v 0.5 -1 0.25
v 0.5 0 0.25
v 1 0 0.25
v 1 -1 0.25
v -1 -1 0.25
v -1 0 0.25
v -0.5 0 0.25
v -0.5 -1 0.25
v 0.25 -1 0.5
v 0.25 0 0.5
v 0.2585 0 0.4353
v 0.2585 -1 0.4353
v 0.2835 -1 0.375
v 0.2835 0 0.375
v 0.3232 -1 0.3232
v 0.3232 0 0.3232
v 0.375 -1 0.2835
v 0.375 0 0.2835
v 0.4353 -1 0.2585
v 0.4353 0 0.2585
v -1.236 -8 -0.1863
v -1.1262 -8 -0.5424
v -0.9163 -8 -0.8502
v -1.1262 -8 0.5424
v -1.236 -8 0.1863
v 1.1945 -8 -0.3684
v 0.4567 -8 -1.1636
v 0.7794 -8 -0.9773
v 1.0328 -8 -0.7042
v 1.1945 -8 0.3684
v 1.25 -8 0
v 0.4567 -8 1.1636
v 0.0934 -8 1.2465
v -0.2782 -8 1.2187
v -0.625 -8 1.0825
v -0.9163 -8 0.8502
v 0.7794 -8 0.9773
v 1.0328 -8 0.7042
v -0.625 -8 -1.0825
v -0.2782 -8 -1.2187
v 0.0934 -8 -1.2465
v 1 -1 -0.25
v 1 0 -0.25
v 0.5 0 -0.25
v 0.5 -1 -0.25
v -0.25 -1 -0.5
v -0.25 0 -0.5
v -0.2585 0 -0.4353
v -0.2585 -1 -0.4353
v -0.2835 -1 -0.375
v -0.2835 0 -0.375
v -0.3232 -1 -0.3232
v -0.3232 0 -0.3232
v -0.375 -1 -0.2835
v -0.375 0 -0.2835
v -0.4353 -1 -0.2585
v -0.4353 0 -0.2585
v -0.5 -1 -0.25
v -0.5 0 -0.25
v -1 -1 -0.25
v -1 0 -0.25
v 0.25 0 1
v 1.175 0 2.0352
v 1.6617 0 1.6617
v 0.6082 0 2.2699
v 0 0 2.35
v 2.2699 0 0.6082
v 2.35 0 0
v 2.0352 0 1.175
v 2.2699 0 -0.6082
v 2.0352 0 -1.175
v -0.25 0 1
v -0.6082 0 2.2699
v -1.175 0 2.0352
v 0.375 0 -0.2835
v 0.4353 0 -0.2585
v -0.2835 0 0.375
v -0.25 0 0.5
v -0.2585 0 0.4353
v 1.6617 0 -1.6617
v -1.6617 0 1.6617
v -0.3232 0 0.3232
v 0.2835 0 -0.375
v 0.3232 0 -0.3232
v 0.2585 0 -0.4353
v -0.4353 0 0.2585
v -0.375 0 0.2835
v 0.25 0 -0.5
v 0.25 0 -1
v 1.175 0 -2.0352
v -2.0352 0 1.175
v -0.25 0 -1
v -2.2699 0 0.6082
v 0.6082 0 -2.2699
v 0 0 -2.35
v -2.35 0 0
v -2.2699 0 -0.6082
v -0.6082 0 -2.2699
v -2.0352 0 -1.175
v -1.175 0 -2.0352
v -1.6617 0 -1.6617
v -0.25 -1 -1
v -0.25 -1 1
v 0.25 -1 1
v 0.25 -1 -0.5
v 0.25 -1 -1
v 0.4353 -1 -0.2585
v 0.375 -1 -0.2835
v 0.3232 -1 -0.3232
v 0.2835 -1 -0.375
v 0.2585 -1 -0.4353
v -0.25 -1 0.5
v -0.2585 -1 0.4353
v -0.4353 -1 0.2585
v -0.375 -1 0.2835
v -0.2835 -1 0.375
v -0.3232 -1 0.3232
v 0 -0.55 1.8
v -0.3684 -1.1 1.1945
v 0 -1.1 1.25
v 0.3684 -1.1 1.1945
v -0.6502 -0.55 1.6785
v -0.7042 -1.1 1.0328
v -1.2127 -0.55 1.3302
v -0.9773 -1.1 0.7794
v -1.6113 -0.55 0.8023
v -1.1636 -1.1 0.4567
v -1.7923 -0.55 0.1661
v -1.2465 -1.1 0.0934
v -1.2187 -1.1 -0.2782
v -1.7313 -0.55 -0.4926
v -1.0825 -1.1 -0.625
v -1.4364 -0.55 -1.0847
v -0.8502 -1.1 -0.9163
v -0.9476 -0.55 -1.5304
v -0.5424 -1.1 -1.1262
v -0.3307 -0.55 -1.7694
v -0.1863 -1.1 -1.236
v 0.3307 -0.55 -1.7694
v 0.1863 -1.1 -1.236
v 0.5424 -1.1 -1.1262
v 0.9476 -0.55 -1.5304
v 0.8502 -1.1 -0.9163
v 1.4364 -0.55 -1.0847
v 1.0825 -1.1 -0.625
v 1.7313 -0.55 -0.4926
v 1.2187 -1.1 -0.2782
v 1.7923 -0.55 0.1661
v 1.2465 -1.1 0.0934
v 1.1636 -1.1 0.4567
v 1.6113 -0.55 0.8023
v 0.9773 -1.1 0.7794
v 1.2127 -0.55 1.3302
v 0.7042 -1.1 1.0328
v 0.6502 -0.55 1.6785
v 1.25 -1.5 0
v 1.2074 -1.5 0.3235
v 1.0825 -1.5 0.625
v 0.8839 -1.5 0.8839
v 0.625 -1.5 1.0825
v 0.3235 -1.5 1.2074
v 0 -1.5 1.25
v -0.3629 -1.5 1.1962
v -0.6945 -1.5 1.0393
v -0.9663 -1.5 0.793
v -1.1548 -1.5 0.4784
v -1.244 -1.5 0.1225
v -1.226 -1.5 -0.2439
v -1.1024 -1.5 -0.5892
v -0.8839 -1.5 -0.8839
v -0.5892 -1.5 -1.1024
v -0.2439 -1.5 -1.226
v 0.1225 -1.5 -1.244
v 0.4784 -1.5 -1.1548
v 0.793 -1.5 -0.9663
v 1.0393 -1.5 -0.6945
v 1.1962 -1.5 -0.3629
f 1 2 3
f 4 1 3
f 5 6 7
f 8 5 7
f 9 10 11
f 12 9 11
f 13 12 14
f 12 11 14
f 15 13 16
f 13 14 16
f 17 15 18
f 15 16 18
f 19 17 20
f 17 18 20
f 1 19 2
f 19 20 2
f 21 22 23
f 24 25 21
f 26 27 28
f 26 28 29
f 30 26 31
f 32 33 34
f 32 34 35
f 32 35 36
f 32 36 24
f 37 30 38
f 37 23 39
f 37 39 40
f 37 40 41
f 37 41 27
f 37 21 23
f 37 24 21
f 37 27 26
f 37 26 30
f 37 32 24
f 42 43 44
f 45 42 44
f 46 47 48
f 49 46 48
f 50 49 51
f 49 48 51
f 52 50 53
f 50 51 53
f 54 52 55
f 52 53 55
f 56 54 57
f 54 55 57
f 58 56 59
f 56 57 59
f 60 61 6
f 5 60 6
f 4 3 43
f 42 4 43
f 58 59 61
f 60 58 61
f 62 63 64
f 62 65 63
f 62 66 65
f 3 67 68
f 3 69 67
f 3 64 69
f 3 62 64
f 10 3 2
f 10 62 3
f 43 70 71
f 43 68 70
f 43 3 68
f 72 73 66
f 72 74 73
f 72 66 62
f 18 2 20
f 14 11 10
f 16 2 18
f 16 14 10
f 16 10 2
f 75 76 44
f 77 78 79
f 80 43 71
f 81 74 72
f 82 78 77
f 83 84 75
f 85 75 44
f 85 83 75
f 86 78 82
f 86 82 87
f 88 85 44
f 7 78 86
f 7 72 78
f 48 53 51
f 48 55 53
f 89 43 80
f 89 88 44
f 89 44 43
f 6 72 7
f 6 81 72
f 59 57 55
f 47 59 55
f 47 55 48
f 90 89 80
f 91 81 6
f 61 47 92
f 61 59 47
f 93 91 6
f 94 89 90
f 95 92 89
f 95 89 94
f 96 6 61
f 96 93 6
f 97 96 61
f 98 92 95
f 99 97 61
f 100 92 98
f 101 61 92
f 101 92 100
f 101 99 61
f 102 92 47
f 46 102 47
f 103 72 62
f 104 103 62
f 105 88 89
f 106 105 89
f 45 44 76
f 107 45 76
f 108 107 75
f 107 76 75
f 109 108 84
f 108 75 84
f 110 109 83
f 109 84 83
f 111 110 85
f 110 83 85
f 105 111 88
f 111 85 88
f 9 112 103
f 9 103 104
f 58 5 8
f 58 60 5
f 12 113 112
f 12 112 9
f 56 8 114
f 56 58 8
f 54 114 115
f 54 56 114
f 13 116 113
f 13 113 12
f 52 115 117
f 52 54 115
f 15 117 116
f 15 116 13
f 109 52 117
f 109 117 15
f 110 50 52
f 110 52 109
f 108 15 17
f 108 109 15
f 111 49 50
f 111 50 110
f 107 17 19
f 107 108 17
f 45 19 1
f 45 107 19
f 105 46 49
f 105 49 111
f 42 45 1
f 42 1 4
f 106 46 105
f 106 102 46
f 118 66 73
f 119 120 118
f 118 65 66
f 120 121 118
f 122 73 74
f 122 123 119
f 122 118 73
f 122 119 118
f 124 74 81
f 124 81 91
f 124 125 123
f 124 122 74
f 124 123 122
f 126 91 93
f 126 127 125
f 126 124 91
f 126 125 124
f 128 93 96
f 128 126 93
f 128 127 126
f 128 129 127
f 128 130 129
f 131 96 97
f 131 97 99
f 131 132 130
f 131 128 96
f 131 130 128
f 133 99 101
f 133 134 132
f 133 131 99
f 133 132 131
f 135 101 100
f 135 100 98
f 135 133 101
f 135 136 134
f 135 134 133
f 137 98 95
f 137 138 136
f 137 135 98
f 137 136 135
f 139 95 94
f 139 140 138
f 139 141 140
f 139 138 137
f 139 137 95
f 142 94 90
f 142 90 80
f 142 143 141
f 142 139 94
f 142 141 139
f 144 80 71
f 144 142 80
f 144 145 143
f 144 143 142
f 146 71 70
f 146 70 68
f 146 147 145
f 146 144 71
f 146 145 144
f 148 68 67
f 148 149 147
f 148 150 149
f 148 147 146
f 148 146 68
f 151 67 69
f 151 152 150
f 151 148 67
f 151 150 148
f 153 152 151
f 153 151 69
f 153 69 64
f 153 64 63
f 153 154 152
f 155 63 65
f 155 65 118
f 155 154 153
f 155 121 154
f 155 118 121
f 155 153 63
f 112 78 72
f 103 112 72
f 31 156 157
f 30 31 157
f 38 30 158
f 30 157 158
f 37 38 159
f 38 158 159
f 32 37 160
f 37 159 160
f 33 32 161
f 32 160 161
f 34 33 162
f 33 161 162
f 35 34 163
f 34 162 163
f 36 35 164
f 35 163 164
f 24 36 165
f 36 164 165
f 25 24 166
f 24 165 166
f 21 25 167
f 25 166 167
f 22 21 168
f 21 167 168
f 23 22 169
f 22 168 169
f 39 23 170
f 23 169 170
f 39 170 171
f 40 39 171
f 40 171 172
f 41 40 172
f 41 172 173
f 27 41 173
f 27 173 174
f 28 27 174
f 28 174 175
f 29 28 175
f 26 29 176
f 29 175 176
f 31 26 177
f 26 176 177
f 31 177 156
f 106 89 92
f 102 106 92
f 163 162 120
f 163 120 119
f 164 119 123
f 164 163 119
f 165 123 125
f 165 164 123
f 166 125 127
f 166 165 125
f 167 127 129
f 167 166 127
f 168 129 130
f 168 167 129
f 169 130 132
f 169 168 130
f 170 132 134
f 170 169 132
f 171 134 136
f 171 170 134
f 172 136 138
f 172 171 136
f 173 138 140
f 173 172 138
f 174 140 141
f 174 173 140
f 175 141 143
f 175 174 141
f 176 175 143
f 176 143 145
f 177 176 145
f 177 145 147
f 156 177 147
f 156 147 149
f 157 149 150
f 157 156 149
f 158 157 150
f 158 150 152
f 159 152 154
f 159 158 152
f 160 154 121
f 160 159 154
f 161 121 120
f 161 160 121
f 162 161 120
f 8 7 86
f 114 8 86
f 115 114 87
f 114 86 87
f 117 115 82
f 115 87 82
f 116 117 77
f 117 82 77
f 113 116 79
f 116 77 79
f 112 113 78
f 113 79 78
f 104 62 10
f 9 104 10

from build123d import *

# Parameters (mm, degrees)
SKETCH2_R           = 1.25
BOSS_EXTRUDE1_DEPTH = 6.5
CUT_EXTRUDE1_DEPTH  = 1


with BuildPart() as part:
    # Sketch1 → Revolve1 (revolve)
    with BuildSketch(Plane(origin=(0, 0, 0), x_dir=(0, 0, -1), z_dir=(1, 0, 0))):
        Polygon((0, 0), (-2.35, 0), (-1.25, -1.1), (-1.25, -1.5), (0, -1.5), align=None)
    revolve(axis=Axis((0, 0.872326939, 0), (0, -1, 0)))

    # Sketch2 → Boss-Extrude1 (add)
    with BuildSketch(Plane.XZ.offset(1.5)):
        Circle(SKETCH2_R)
    extrude(amount=BOSS_EXTRUDE1_DEPTH)

    # Sketch3 → Cut-Extrude1 (cut)
    with BuildSketch(Plane(origin=(0, 0, 0), x_dir=(1, 0, 0), z_dir=(0, 1, 0))):
        with BuildLine():
            Line((-1, -0.25), (-0.5, -0.25))
            ThreePointArc((-0.5, -0.25), (-0.323223305, -0.323223305), (-0.25, -0.5))
            Line((-0.25, -0.5), (-0.25, -1))
            Line((-0.25, -1), (0.25, -1))
            Line((0.25, -1), (0.25, -0.5))
            ThreePointArc((0.25, -0.5), (0.323223305, -0.323223305), (0.5, -0.25))
            Line((0.5, -0.25), (1, -0.25))
            Line((1, -0.25), (1, 0.25))
            Line((1, 0.25), (0.5, 0.25))
            ThreePointArc((0.5, 0.25), (0.323223305, 0.323223305), (0.25, 0.5))
            Line((0.25, 0.5), (0.25, 1))
            Line((0.25, 1), (-0.25, 1))
            Line((-0.25, 1), (-0.25, 0.5))
            ThreePointArc((-0.25, 0.5), (-0.323223305, 0.323223305), (-0.5, 0.25))
            Line((-0.5, 0.25), (-1, 0.25))
            Line((-1, 0.25), (-1, -0.25))
        make_face()
    extrude(amount=-CUT_EXTRUDE1_DEPTH, mode=Mode.SUBTRACT)


solid = part.part
